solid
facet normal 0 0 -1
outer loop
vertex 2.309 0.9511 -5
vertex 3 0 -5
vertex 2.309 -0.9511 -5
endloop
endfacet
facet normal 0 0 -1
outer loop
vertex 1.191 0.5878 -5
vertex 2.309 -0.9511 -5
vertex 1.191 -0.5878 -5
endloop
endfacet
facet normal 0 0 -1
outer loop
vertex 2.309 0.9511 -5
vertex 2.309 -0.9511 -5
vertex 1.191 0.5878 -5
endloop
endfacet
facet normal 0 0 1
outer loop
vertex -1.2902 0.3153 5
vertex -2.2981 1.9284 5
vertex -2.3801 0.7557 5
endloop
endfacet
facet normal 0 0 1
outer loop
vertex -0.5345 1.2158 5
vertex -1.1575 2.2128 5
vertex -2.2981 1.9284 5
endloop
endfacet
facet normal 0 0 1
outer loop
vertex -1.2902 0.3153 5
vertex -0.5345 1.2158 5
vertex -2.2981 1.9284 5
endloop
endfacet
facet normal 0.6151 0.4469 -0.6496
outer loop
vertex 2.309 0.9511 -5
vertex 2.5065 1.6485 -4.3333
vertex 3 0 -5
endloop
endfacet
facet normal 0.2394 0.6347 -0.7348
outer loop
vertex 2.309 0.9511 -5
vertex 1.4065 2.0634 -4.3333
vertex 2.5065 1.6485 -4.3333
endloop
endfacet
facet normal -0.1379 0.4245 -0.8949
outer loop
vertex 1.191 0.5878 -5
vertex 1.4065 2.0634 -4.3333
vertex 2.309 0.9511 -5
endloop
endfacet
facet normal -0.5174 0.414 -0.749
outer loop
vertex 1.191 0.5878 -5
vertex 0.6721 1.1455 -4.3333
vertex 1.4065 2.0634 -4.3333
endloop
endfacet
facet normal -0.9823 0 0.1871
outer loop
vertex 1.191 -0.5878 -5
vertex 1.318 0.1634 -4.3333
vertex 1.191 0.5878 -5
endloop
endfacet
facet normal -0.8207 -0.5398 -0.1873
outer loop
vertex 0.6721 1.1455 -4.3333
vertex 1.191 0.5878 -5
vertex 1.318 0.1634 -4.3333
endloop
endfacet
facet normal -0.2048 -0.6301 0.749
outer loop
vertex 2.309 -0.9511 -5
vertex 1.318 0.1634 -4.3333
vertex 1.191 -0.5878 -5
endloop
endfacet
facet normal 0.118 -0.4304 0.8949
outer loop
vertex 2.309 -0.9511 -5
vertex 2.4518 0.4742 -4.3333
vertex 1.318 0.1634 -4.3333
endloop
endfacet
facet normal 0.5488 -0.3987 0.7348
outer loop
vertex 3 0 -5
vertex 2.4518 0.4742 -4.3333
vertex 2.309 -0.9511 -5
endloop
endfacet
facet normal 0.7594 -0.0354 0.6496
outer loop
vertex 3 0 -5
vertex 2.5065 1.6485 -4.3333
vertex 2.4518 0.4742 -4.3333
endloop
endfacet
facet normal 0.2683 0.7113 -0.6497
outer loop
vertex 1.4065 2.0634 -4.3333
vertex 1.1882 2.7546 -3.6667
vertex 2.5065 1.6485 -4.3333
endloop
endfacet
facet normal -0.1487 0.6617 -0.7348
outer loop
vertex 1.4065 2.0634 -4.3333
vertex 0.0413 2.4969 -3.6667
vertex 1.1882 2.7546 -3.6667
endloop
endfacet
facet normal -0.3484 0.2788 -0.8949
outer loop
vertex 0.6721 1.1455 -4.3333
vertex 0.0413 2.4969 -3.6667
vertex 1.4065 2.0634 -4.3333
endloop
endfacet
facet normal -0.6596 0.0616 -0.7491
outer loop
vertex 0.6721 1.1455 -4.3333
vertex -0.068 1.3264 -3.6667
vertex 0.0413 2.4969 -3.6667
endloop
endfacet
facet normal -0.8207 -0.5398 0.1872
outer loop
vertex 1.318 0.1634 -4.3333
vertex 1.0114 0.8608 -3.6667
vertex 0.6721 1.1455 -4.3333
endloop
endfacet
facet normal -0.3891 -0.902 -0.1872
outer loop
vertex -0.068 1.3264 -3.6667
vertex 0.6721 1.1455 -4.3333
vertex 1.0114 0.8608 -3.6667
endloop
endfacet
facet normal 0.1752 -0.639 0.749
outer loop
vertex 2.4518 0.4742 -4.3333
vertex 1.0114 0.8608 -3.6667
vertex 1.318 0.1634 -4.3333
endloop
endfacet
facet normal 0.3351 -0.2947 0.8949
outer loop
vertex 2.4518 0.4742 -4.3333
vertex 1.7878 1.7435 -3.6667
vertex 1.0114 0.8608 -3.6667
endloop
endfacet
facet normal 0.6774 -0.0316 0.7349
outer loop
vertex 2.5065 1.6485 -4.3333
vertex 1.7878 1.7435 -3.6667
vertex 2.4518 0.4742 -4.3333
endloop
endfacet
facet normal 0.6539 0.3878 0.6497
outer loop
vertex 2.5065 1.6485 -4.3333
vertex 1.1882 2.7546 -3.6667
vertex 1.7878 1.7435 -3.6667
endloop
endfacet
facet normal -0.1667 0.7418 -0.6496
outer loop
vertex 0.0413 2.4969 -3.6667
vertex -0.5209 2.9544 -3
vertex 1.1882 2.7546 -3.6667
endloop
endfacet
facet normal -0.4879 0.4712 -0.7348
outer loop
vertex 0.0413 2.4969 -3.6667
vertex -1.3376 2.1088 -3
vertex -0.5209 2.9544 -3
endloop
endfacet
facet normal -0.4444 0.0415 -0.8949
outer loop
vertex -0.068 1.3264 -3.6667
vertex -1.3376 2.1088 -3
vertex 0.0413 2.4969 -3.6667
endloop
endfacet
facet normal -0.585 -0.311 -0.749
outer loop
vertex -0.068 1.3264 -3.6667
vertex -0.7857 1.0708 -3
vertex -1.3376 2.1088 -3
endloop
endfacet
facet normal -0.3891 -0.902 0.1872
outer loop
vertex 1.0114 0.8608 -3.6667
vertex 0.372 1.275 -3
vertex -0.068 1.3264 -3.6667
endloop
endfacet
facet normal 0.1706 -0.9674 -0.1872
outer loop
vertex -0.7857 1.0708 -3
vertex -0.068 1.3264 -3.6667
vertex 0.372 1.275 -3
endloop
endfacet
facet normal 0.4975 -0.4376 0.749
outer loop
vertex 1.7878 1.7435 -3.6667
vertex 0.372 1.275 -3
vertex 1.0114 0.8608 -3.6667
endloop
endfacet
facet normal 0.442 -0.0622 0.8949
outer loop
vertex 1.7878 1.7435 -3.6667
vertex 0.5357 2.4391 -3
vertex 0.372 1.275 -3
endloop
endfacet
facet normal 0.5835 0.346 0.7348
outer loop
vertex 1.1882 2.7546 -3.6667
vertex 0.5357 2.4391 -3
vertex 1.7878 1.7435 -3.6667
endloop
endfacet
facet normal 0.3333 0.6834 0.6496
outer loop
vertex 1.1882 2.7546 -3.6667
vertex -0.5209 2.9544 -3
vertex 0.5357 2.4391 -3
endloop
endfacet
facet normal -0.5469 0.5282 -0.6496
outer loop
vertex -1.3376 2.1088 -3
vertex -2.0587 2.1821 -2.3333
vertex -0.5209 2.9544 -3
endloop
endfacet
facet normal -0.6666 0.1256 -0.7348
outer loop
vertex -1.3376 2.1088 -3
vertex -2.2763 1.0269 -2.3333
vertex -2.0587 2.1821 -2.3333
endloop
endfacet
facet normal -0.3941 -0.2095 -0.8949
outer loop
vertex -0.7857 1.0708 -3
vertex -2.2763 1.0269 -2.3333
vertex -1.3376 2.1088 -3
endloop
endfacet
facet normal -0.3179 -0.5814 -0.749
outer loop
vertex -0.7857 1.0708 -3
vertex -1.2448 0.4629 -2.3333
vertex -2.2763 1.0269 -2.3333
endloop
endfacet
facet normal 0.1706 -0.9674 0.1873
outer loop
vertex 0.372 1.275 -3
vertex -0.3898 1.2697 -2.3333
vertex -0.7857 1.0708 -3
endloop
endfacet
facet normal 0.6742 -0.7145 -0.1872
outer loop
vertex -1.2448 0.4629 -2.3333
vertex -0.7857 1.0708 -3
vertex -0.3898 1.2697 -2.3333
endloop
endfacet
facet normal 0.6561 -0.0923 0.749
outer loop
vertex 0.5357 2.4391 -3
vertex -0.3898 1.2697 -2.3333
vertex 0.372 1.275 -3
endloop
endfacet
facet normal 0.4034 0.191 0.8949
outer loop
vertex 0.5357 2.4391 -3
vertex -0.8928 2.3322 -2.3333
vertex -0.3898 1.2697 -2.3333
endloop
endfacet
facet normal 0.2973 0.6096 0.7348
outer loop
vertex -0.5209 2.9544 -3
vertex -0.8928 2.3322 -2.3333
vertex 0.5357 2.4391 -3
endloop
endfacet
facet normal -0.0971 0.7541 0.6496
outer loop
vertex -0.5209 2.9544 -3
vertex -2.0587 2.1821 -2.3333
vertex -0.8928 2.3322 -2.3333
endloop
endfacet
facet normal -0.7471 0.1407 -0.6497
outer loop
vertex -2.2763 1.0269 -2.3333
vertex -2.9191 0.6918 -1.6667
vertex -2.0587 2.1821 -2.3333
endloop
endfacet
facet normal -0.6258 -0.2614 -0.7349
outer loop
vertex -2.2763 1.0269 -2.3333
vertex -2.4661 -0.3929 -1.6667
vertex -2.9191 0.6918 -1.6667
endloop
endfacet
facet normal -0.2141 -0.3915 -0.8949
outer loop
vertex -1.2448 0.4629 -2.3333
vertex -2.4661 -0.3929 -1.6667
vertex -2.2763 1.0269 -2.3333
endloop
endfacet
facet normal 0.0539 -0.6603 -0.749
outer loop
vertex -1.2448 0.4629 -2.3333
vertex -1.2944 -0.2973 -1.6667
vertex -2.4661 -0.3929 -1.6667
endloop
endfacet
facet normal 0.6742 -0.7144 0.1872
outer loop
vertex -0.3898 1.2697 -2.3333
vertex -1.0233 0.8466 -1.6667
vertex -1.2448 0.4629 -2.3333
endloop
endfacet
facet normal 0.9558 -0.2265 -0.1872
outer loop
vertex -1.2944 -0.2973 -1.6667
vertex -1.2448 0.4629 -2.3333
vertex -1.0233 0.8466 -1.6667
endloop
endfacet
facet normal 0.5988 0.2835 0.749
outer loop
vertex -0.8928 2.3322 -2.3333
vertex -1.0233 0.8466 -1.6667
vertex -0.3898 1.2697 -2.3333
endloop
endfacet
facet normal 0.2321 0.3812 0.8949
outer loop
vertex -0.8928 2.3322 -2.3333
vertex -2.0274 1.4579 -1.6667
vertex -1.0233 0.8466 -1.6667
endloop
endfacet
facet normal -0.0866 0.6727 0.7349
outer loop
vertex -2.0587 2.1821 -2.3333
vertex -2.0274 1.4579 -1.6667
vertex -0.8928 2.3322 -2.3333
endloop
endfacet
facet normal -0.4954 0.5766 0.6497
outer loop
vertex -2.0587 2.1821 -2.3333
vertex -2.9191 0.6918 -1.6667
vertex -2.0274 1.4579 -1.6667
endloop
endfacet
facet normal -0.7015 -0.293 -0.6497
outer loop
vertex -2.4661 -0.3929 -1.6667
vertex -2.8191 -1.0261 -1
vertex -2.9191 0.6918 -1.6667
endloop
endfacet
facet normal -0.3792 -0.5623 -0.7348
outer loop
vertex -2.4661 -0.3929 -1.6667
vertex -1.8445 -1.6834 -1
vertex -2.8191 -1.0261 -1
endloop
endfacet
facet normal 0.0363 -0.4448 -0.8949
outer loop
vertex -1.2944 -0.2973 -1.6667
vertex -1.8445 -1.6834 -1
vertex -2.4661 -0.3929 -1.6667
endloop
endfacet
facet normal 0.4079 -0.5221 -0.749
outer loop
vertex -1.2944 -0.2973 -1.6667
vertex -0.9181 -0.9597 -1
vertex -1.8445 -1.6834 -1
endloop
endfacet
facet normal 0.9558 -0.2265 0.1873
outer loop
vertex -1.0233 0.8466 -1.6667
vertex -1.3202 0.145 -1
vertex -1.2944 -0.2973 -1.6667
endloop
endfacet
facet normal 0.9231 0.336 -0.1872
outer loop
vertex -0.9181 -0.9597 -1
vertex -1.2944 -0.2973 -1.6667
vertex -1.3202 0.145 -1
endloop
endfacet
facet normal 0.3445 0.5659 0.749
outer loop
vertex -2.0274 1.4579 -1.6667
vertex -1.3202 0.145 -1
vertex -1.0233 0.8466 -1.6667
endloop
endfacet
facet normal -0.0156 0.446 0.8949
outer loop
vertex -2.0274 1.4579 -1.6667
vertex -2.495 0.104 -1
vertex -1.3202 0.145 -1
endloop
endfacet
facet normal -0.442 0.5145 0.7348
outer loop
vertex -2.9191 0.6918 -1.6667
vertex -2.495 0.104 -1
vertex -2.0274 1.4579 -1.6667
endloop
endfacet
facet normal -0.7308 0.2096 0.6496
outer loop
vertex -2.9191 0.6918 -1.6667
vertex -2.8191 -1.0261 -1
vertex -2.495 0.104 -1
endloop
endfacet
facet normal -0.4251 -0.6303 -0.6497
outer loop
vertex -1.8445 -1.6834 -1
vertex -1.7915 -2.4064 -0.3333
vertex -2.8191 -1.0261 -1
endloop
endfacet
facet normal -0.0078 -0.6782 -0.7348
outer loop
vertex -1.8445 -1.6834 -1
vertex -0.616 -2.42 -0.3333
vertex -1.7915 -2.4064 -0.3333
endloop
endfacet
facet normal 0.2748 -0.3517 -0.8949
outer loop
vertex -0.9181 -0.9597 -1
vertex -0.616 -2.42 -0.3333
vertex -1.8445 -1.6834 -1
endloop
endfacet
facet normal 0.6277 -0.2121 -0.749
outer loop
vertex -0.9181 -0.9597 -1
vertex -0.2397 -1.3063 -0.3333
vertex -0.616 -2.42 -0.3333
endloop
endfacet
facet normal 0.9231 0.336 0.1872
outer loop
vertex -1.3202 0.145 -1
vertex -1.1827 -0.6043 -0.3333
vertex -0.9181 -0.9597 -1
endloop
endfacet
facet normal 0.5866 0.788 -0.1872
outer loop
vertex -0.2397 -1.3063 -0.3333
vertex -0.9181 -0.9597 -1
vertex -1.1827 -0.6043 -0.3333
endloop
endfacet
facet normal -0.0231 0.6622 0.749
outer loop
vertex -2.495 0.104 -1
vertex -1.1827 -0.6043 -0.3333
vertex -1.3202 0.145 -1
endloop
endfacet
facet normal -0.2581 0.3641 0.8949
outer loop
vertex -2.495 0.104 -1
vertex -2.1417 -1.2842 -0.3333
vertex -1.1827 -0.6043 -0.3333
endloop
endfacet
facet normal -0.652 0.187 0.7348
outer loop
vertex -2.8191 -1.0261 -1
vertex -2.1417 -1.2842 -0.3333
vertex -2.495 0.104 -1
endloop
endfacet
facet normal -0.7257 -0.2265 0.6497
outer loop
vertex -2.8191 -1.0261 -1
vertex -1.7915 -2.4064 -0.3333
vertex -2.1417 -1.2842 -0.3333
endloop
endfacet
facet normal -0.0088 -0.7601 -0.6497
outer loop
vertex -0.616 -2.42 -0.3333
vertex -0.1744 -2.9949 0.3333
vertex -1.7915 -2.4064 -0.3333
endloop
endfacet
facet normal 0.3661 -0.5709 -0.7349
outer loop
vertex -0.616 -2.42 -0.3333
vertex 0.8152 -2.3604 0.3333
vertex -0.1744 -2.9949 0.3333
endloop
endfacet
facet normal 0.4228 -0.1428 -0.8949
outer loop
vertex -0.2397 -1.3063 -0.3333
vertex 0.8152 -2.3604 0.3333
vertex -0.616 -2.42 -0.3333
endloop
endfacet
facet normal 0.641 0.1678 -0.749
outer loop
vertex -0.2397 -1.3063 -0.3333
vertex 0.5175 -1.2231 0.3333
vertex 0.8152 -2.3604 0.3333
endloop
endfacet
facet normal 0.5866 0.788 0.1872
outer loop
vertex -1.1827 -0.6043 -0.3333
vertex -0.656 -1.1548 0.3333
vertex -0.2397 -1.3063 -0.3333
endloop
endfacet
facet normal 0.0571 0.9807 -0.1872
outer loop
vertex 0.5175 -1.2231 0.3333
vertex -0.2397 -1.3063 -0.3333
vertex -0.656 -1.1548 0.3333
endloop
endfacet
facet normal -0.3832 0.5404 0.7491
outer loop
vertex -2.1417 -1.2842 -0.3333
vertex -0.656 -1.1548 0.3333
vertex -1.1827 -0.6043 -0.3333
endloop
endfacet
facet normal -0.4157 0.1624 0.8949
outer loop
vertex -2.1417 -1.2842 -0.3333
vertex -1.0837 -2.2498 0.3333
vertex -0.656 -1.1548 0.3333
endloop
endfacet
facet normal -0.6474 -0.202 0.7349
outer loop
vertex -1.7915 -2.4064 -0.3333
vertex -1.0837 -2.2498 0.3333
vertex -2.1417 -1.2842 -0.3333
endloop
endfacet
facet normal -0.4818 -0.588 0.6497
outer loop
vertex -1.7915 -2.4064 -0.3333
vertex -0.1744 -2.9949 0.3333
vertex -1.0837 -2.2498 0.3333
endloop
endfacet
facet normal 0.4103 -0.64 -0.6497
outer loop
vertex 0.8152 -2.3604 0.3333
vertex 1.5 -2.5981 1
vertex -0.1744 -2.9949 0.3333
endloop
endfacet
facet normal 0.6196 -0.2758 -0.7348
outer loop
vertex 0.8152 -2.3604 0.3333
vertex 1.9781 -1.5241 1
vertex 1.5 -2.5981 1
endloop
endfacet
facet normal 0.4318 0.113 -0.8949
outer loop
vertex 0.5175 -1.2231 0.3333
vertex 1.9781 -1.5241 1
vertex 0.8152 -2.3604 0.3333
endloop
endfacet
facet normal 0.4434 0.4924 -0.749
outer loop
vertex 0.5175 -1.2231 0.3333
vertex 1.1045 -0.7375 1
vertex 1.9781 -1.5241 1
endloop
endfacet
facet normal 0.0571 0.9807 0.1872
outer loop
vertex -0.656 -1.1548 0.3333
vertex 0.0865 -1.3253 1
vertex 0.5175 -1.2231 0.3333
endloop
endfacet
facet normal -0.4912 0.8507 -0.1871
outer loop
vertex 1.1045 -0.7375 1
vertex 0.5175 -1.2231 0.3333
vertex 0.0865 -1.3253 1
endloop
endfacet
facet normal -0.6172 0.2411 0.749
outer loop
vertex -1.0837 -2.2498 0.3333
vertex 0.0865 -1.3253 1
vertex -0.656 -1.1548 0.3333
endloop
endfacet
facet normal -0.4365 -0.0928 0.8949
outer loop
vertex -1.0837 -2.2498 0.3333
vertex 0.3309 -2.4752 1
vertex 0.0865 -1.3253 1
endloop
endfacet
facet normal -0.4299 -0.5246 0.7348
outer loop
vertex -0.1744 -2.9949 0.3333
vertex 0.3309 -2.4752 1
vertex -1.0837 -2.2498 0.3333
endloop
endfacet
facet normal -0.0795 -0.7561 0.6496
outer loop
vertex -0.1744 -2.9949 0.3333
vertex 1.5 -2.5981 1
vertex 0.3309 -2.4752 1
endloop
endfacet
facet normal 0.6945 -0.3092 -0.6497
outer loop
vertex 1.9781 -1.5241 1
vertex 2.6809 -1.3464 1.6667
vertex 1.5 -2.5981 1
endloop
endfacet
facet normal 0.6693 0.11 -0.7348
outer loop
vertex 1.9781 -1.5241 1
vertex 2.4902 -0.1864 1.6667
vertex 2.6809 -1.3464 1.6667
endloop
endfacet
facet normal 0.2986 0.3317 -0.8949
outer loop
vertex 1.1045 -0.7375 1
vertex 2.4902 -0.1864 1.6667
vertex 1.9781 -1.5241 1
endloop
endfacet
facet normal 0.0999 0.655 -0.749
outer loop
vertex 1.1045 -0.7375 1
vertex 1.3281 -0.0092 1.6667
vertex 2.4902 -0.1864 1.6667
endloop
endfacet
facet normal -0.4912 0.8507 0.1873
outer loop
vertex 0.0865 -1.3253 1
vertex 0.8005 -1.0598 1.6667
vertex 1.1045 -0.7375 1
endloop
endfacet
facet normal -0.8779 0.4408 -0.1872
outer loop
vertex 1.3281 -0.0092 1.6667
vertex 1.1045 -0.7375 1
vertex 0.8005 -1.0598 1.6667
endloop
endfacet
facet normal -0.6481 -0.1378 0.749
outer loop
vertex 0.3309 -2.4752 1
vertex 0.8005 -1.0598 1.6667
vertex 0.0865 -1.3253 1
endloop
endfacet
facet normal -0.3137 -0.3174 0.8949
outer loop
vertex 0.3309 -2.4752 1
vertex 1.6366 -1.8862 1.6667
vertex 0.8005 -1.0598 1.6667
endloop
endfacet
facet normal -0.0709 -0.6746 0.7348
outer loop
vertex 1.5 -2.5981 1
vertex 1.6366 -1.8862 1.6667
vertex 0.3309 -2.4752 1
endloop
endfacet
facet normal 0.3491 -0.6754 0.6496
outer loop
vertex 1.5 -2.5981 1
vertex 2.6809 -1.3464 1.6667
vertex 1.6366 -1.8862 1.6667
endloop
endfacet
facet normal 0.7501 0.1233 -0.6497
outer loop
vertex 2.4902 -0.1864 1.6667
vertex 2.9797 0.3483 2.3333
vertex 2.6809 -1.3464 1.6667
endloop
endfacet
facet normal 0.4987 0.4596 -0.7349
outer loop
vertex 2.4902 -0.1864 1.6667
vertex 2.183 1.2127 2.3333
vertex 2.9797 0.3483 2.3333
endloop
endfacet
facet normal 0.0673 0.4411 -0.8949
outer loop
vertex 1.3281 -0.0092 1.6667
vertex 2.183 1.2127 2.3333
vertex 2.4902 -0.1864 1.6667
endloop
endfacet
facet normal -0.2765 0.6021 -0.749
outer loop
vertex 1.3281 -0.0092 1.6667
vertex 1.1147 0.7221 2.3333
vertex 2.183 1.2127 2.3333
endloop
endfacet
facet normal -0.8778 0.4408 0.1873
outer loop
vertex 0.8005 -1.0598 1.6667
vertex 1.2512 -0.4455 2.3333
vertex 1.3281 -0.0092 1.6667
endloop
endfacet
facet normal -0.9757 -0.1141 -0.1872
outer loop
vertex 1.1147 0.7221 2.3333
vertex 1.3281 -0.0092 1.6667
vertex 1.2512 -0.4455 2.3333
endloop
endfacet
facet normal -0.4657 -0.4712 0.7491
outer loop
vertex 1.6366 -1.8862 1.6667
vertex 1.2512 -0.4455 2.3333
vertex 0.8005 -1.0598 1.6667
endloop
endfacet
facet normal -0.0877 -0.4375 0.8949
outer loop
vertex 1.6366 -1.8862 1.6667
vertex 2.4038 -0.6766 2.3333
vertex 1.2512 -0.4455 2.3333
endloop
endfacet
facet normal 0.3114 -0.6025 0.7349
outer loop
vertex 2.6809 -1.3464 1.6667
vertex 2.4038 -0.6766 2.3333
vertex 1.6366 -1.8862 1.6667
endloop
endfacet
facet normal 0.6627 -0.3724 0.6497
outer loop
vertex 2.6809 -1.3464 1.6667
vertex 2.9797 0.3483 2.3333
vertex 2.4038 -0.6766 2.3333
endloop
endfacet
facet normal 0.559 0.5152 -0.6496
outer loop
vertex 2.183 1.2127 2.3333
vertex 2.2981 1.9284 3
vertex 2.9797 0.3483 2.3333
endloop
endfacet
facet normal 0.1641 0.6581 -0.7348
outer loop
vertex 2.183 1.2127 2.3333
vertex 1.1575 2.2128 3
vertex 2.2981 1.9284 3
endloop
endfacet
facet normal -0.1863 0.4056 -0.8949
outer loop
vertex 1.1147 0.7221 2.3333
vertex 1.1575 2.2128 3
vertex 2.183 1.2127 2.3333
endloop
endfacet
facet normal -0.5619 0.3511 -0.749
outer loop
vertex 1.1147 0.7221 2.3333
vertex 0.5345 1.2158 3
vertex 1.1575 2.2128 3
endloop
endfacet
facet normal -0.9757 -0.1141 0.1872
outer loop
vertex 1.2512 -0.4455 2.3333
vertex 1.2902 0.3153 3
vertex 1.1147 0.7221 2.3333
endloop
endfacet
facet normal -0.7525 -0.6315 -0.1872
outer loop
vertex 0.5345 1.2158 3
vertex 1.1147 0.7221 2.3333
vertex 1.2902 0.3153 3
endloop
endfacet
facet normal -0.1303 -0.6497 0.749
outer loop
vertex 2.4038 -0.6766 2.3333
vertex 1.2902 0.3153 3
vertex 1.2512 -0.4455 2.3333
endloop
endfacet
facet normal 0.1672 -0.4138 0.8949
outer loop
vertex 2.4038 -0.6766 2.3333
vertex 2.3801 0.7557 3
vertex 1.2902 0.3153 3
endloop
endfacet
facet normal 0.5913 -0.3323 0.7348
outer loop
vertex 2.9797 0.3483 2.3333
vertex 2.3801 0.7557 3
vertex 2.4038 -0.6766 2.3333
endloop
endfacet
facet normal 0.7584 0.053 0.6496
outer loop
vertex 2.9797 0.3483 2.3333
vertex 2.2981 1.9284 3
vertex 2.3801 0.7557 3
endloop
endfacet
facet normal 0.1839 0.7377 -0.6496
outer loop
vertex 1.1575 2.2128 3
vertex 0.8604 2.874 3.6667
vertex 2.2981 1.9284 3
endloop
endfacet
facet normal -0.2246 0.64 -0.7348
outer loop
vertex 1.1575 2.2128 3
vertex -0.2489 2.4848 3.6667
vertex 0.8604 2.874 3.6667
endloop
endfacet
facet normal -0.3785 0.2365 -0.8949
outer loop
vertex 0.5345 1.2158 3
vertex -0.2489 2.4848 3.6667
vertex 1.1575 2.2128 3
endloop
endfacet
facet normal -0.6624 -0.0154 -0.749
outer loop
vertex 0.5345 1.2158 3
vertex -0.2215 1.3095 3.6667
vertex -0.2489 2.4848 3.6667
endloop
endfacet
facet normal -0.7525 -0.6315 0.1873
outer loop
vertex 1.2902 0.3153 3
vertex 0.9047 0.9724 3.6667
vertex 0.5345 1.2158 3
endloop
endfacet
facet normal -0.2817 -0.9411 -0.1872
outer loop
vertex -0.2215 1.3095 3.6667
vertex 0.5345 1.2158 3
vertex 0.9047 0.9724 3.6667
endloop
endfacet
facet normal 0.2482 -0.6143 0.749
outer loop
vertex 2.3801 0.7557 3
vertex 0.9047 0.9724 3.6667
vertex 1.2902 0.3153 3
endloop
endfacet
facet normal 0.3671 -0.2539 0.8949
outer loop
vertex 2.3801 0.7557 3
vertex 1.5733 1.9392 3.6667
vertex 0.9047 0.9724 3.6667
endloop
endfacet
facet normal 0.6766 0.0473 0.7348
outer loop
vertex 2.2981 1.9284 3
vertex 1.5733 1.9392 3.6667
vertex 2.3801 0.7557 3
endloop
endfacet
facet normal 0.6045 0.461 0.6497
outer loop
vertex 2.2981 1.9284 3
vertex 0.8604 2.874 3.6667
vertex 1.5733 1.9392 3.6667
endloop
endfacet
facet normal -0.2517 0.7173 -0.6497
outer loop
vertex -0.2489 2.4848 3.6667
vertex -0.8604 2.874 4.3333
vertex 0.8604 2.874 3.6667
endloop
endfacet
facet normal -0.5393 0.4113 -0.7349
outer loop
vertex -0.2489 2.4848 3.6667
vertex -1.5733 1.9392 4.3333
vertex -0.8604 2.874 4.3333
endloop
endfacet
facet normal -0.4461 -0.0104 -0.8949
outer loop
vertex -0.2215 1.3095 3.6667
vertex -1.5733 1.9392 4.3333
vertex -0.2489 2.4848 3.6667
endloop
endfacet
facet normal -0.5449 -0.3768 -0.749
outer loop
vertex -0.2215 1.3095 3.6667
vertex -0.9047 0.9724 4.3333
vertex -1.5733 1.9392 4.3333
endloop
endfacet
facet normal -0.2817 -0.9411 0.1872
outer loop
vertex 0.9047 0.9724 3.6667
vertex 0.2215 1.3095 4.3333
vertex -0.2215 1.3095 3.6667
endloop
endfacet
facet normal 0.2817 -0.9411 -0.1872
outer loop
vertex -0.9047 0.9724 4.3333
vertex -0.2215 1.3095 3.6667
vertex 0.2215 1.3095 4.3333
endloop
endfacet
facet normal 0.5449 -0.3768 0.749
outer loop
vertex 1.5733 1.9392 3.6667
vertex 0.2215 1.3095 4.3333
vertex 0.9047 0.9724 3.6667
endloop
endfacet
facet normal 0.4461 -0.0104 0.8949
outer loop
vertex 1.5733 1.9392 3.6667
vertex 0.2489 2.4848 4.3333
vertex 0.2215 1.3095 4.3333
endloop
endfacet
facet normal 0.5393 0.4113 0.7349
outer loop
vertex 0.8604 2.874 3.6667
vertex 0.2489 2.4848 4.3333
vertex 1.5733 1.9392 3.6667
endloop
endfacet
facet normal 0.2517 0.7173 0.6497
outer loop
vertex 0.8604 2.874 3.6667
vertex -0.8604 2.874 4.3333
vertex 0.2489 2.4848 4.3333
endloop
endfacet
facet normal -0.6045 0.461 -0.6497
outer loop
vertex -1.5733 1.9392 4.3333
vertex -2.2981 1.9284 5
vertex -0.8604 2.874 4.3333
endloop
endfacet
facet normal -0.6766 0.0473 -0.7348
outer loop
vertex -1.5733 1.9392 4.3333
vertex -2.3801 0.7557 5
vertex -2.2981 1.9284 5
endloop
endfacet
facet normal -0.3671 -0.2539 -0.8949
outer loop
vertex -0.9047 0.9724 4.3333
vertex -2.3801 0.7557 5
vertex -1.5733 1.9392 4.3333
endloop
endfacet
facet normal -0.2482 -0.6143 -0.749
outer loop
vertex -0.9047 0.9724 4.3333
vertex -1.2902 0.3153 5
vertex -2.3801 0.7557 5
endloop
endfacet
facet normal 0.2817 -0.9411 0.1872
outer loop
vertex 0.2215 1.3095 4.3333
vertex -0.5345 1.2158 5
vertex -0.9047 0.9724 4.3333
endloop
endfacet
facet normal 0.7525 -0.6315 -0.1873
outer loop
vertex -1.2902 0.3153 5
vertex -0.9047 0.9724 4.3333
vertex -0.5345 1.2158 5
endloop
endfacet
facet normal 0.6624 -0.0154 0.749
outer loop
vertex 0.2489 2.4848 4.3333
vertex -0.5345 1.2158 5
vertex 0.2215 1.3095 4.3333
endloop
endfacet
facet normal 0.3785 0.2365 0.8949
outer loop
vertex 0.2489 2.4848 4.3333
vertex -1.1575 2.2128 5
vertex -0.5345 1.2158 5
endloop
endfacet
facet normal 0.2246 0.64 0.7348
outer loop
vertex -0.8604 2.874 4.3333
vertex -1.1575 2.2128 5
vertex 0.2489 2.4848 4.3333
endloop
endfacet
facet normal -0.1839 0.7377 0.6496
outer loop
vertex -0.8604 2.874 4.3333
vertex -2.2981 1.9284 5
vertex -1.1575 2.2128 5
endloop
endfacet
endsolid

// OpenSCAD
// Unit of length: Unit.MM
linear_extrude(height = 10.0, center = true, convexity = 10, twist = -500.0, scale = 1.0)
{
   translate(v = [2.0, 0.0])
   {
      circle(r = 1.0);
   }
}
